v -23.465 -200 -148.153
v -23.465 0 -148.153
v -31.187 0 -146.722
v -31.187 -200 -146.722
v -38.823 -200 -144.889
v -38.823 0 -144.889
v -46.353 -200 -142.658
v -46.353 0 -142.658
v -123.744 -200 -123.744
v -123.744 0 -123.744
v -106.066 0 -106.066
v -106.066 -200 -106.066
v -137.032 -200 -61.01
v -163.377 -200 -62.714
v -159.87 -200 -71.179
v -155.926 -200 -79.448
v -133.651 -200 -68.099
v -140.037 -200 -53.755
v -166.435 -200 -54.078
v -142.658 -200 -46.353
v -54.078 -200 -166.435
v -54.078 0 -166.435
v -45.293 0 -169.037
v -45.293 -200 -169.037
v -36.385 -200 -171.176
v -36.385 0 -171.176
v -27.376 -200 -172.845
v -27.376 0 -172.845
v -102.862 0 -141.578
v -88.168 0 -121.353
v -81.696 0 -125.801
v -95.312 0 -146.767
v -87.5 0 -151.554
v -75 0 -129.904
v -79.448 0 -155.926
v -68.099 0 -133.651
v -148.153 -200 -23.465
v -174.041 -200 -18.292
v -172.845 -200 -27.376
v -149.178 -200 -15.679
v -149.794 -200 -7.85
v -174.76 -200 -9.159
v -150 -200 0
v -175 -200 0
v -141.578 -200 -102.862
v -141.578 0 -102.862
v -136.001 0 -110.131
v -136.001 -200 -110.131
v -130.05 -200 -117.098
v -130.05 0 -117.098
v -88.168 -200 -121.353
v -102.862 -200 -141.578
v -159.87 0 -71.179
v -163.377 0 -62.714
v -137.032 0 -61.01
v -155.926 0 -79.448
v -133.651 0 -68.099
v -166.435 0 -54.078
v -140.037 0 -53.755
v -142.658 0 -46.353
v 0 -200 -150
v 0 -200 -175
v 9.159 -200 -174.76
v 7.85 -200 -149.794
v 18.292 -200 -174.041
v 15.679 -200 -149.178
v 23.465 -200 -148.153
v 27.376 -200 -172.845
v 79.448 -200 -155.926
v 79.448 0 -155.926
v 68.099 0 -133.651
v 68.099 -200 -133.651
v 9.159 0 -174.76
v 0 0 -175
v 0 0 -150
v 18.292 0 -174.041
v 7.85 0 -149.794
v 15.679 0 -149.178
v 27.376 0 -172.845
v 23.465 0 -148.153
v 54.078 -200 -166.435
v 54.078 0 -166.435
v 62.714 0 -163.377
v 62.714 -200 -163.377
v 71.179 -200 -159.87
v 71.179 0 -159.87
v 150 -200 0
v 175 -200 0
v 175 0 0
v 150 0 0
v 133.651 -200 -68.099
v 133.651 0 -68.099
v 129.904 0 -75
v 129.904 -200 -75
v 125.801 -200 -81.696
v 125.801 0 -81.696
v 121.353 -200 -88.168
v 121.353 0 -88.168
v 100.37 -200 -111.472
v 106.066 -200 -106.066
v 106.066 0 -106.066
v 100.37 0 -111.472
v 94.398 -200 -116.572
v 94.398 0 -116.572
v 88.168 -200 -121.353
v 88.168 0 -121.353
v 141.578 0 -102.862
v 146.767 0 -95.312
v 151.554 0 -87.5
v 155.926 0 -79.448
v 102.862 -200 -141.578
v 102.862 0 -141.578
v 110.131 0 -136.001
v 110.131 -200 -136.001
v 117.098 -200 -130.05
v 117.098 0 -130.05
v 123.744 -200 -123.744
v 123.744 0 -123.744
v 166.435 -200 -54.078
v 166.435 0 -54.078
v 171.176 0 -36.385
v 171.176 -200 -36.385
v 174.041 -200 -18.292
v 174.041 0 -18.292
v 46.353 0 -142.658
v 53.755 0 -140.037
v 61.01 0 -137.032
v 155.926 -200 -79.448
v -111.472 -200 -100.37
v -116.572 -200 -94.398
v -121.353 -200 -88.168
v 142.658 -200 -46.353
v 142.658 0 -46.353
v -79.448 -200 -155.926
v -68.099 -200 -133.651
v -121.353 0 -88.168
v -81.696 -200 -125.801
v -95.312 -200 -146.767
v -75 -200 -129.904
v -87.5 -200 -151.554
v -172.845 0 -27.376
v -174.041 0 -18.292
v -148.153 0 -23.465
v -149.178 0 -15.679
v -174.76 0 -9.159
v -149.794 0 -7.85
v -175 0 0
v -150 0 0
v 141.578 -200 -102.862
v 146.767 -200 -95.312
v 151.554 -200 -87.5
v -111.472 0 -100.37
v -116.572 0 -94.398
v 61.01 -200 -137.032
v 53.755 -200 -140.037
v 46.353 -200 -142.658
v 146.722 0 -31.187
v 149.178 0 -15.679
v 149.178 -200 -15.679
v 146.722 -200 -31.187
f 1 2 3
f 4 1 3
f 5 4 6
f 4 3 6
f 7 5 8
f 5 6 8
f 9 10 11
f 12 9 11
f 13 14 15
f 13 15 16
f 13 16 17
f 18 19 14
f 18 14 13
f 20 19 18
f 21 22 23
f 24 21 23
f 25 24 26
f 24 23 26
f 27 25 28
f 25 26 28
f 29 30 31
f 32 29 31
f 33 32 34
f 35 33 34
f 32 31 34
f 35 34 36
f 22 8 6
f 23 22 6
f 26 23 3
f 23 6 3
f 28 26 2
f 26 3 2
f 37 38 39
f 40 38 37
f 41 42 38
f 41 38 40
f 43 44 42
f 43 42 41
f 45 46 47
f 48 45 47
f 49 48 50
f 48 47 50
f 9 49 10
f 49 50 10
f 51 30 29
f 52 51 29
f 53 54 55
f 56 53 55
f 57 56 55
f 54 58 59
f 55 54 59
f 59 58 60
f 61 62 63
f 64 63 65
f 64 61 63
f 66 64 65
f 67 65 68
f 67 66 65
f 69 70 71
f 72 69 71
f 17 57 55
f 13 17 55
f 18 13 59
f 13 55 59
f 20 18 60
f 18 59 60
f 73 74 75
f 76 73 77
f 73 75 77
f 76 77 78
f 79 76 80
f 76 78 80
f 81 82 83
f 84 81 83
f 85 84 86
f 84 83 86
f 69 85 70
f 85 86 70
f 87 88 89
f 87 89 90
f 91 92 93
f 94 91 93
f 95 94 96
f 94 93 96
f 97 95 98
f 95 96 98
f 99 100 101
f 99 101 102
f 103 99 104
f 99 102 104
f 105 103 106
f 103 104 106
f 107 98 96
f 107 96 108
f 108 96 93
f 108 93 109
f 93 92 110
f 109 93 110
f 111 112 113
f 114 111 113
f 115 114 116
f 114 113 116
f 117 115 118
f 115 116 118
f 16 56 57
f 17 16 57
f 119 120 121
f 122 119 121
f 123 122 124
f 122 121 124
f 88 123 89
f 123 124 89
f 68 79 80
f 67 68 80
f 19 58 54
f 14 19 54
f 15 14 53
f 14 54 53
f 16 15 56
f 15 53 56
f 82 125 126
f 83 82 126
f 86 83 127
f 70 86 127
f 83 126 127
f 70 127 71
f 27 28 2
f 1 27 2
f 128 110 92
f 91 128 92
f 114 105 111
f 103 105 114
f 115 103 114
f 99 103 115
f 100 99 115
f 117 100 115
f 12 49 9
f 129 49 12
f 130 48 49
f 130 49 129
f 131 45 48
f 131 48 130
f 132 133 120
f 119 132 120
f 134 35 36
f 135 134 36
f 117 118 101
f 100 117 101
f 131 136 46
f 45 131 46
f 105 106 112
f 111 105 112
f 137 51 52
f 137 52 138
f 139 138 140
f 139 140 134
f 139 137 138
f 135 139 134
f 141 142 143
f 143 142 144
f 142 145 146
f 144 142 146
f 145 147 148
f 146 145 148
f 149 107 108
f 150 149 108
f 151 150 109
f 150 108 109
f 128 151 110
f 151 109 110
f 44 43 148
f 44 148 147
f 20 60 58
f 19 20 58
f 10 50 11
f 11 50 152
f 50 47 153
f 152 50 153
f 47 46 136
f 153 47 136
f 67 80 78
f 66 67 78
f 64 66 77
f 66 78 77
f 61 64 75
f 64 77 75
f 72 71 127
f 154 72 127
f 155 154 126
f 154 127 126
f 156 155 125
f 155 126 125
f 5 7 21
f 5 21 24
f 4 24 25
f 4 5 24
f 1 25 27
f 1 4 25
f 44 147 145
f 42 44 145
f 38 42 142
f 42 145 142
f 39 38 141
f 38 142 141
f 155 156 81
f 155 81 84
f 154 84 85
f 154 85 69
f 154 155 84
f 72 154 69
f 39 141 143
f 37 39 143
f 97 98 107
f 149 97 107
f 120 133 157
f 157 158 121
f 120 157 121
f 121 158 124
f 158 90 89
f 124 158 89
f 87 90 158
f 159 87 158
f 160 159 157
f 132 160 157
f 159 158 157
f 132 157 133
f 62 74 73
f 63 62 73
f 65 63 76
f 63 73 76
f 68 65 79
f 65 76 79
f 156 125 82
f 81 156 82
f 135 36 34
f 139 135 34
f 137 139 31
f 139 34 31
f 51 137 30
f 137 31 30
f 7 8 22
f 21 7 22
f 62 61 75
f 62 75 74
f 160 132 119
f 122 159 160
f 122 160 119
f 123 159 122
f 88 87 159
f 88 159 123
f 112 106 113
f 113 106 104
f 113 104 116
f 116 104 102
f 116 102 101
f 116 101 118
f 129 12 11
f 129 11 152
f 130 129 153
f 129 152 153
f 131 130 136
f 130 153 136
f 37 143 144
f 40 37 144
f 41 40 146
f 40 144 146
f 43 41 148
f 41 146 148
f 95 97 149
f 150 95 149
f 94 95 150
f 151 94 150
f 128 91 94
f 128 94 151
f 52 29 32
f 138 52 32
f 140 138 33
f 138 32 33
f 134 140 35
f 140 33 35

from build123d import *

# Parameters (mm, degrees)
F1_DEPTH = 200


with BuildPart() as f1:
    # F0 (on Front) → F1 (new body)
    with BuildSketch(Plane.XZ):
        with BuildLine():
            Line((-150, 0), (-175, 0))
            ThreePointArc((-175, 0), (-174.460533, -13.730342), (-172.84546, -27.376031))
            Line((-172.84546, -27.376031), (-148.153251, -23.46517))
            ThreePointArc((-148.153251, -23.46517), (-149.5376, -11.768864), (-150, 0))
        make_face()
        with BuildLine():
            Line((175, 0), (150, 0))
            ThreePointArc((150, 0), (148.153251, -23.46517), (142.658477, -46.352549))
            Line((142.658477, -46.352549), (166.43489, -54.077974))
            ThreePointArc((166.43489, -54.077974), (172.84546, -27.376031), (175, 0))
        make_face()
        with BuildLine():
            ThreePointArc((-133.650979, -68.098575), (-138.58193, -57.402515), (-142.658477, -46.352549))
            Line((-142.658477, -46.352549), (-166.43489, -54.077974))
            ThreePointArc((-166.43489, -54.077974), (-161.678918, -66.969601), (-155.926142, -79.448337))
            Line((-155.926142, -79.448337), (-133.650979, -68.098575))
        make_face()
        with BuildLine():
            ThreePointArc((-106.066017, -106.066017), (-114.060895, -97.417207), (-121.352549, -88.167788))
            Line((-121.352549, -88.167788), (-141.577974, -102.862419))
            ThreePointArc((-141.577974, -102.862419), (-133.071044, -113.653408), (-123.743687, -123.743687))
            Line((-123.743687, -123.743687), (-106.066017, -106.066017))
        make_face()
        with BuildLine():
            ThreePointArc((-68.098575, -133.650979), (-78.374785, -127.896025), (-88.167788, -121.352549))
            Line((-88.167788, -121.352549), (-102.862419, -141.577974))
            ThreePointArc((-102.862419, -141.577974), (-91.437249, -149.212029), (-79.448337, -155.926142))
            Line((-79.448337, -155.926142), (-68.098575, -133.650979))
        make_face()
        with BuildLine():
            ThreePointArc((-23.46517, -148.153251), (-35.016805, -145.855488), (-46.352549, -142.658477))
            Line((-46.352549, -142.658477), (-54.077974, -166.43489))
            ThreePointArc((-54.077974, -166.43489), (-40.852939, -170.164736), (-27.376031, -172.84546))
            Line((-27.376031, -172.84546), (-23.46517, -148.153251))
        make_face()
        with BuildLine():
            ThreePointArc((23.46517, -148.153251), (11.768864, -149.5376), (0, -150))
            Line((0, -150), (0, -175))
            ThreePointArc((0, -175), (13.730342, -174.460533), (27.376031, -172.84546))
            Line((27.376031, -172.84546), (23.46517, -148.153251))
        make_face()
        with BuildLine():
            ThreePointArc((68.098575, -133.650979), (57.402515, -138.58193), (46.352549, -142.658477))
            Line((46.352549, -142.658477), (54.077974, -166.43489))
            ThreePointArc((54.077974, -166.43489), (66.969601, -161.678918), (79.448337, -155.926142))
            Line((79.448337, -155.926142), (68.098575, -133.650979))
        make_face()
        with BuildLine():
            ThreePointArc((106.066017, -106.066017), (97.417207, -114.060895), (88.167788, -121.352549))
            Line((88.167788, -121.352549), (102.862419, -141.577974))
            ThreePointArc((102.862419, -141.577974), (113.653408, -133.071044), (123.743687, -123.743687))
            Line((123.743687, -123.743687), (106.066017, -106.066017))
        make_face()
        with BuildLine():
            ThreePointArc((133.650979, -68.098575), (127.896025, -78.374785), (121.352549, -88.167788))
            Line((121.352549, -88.167788), (141.577974, -102.862419))
            ThreePointArc((141.577974, -102.862419), (149.212029, -91.437249), (155.926142, -79.448337))
            Line((155.926142, -79.448337), (133.650979, -68.098575))
        make_face()
    extrude(amount=F1_DEPTH)


solid = f1.part
